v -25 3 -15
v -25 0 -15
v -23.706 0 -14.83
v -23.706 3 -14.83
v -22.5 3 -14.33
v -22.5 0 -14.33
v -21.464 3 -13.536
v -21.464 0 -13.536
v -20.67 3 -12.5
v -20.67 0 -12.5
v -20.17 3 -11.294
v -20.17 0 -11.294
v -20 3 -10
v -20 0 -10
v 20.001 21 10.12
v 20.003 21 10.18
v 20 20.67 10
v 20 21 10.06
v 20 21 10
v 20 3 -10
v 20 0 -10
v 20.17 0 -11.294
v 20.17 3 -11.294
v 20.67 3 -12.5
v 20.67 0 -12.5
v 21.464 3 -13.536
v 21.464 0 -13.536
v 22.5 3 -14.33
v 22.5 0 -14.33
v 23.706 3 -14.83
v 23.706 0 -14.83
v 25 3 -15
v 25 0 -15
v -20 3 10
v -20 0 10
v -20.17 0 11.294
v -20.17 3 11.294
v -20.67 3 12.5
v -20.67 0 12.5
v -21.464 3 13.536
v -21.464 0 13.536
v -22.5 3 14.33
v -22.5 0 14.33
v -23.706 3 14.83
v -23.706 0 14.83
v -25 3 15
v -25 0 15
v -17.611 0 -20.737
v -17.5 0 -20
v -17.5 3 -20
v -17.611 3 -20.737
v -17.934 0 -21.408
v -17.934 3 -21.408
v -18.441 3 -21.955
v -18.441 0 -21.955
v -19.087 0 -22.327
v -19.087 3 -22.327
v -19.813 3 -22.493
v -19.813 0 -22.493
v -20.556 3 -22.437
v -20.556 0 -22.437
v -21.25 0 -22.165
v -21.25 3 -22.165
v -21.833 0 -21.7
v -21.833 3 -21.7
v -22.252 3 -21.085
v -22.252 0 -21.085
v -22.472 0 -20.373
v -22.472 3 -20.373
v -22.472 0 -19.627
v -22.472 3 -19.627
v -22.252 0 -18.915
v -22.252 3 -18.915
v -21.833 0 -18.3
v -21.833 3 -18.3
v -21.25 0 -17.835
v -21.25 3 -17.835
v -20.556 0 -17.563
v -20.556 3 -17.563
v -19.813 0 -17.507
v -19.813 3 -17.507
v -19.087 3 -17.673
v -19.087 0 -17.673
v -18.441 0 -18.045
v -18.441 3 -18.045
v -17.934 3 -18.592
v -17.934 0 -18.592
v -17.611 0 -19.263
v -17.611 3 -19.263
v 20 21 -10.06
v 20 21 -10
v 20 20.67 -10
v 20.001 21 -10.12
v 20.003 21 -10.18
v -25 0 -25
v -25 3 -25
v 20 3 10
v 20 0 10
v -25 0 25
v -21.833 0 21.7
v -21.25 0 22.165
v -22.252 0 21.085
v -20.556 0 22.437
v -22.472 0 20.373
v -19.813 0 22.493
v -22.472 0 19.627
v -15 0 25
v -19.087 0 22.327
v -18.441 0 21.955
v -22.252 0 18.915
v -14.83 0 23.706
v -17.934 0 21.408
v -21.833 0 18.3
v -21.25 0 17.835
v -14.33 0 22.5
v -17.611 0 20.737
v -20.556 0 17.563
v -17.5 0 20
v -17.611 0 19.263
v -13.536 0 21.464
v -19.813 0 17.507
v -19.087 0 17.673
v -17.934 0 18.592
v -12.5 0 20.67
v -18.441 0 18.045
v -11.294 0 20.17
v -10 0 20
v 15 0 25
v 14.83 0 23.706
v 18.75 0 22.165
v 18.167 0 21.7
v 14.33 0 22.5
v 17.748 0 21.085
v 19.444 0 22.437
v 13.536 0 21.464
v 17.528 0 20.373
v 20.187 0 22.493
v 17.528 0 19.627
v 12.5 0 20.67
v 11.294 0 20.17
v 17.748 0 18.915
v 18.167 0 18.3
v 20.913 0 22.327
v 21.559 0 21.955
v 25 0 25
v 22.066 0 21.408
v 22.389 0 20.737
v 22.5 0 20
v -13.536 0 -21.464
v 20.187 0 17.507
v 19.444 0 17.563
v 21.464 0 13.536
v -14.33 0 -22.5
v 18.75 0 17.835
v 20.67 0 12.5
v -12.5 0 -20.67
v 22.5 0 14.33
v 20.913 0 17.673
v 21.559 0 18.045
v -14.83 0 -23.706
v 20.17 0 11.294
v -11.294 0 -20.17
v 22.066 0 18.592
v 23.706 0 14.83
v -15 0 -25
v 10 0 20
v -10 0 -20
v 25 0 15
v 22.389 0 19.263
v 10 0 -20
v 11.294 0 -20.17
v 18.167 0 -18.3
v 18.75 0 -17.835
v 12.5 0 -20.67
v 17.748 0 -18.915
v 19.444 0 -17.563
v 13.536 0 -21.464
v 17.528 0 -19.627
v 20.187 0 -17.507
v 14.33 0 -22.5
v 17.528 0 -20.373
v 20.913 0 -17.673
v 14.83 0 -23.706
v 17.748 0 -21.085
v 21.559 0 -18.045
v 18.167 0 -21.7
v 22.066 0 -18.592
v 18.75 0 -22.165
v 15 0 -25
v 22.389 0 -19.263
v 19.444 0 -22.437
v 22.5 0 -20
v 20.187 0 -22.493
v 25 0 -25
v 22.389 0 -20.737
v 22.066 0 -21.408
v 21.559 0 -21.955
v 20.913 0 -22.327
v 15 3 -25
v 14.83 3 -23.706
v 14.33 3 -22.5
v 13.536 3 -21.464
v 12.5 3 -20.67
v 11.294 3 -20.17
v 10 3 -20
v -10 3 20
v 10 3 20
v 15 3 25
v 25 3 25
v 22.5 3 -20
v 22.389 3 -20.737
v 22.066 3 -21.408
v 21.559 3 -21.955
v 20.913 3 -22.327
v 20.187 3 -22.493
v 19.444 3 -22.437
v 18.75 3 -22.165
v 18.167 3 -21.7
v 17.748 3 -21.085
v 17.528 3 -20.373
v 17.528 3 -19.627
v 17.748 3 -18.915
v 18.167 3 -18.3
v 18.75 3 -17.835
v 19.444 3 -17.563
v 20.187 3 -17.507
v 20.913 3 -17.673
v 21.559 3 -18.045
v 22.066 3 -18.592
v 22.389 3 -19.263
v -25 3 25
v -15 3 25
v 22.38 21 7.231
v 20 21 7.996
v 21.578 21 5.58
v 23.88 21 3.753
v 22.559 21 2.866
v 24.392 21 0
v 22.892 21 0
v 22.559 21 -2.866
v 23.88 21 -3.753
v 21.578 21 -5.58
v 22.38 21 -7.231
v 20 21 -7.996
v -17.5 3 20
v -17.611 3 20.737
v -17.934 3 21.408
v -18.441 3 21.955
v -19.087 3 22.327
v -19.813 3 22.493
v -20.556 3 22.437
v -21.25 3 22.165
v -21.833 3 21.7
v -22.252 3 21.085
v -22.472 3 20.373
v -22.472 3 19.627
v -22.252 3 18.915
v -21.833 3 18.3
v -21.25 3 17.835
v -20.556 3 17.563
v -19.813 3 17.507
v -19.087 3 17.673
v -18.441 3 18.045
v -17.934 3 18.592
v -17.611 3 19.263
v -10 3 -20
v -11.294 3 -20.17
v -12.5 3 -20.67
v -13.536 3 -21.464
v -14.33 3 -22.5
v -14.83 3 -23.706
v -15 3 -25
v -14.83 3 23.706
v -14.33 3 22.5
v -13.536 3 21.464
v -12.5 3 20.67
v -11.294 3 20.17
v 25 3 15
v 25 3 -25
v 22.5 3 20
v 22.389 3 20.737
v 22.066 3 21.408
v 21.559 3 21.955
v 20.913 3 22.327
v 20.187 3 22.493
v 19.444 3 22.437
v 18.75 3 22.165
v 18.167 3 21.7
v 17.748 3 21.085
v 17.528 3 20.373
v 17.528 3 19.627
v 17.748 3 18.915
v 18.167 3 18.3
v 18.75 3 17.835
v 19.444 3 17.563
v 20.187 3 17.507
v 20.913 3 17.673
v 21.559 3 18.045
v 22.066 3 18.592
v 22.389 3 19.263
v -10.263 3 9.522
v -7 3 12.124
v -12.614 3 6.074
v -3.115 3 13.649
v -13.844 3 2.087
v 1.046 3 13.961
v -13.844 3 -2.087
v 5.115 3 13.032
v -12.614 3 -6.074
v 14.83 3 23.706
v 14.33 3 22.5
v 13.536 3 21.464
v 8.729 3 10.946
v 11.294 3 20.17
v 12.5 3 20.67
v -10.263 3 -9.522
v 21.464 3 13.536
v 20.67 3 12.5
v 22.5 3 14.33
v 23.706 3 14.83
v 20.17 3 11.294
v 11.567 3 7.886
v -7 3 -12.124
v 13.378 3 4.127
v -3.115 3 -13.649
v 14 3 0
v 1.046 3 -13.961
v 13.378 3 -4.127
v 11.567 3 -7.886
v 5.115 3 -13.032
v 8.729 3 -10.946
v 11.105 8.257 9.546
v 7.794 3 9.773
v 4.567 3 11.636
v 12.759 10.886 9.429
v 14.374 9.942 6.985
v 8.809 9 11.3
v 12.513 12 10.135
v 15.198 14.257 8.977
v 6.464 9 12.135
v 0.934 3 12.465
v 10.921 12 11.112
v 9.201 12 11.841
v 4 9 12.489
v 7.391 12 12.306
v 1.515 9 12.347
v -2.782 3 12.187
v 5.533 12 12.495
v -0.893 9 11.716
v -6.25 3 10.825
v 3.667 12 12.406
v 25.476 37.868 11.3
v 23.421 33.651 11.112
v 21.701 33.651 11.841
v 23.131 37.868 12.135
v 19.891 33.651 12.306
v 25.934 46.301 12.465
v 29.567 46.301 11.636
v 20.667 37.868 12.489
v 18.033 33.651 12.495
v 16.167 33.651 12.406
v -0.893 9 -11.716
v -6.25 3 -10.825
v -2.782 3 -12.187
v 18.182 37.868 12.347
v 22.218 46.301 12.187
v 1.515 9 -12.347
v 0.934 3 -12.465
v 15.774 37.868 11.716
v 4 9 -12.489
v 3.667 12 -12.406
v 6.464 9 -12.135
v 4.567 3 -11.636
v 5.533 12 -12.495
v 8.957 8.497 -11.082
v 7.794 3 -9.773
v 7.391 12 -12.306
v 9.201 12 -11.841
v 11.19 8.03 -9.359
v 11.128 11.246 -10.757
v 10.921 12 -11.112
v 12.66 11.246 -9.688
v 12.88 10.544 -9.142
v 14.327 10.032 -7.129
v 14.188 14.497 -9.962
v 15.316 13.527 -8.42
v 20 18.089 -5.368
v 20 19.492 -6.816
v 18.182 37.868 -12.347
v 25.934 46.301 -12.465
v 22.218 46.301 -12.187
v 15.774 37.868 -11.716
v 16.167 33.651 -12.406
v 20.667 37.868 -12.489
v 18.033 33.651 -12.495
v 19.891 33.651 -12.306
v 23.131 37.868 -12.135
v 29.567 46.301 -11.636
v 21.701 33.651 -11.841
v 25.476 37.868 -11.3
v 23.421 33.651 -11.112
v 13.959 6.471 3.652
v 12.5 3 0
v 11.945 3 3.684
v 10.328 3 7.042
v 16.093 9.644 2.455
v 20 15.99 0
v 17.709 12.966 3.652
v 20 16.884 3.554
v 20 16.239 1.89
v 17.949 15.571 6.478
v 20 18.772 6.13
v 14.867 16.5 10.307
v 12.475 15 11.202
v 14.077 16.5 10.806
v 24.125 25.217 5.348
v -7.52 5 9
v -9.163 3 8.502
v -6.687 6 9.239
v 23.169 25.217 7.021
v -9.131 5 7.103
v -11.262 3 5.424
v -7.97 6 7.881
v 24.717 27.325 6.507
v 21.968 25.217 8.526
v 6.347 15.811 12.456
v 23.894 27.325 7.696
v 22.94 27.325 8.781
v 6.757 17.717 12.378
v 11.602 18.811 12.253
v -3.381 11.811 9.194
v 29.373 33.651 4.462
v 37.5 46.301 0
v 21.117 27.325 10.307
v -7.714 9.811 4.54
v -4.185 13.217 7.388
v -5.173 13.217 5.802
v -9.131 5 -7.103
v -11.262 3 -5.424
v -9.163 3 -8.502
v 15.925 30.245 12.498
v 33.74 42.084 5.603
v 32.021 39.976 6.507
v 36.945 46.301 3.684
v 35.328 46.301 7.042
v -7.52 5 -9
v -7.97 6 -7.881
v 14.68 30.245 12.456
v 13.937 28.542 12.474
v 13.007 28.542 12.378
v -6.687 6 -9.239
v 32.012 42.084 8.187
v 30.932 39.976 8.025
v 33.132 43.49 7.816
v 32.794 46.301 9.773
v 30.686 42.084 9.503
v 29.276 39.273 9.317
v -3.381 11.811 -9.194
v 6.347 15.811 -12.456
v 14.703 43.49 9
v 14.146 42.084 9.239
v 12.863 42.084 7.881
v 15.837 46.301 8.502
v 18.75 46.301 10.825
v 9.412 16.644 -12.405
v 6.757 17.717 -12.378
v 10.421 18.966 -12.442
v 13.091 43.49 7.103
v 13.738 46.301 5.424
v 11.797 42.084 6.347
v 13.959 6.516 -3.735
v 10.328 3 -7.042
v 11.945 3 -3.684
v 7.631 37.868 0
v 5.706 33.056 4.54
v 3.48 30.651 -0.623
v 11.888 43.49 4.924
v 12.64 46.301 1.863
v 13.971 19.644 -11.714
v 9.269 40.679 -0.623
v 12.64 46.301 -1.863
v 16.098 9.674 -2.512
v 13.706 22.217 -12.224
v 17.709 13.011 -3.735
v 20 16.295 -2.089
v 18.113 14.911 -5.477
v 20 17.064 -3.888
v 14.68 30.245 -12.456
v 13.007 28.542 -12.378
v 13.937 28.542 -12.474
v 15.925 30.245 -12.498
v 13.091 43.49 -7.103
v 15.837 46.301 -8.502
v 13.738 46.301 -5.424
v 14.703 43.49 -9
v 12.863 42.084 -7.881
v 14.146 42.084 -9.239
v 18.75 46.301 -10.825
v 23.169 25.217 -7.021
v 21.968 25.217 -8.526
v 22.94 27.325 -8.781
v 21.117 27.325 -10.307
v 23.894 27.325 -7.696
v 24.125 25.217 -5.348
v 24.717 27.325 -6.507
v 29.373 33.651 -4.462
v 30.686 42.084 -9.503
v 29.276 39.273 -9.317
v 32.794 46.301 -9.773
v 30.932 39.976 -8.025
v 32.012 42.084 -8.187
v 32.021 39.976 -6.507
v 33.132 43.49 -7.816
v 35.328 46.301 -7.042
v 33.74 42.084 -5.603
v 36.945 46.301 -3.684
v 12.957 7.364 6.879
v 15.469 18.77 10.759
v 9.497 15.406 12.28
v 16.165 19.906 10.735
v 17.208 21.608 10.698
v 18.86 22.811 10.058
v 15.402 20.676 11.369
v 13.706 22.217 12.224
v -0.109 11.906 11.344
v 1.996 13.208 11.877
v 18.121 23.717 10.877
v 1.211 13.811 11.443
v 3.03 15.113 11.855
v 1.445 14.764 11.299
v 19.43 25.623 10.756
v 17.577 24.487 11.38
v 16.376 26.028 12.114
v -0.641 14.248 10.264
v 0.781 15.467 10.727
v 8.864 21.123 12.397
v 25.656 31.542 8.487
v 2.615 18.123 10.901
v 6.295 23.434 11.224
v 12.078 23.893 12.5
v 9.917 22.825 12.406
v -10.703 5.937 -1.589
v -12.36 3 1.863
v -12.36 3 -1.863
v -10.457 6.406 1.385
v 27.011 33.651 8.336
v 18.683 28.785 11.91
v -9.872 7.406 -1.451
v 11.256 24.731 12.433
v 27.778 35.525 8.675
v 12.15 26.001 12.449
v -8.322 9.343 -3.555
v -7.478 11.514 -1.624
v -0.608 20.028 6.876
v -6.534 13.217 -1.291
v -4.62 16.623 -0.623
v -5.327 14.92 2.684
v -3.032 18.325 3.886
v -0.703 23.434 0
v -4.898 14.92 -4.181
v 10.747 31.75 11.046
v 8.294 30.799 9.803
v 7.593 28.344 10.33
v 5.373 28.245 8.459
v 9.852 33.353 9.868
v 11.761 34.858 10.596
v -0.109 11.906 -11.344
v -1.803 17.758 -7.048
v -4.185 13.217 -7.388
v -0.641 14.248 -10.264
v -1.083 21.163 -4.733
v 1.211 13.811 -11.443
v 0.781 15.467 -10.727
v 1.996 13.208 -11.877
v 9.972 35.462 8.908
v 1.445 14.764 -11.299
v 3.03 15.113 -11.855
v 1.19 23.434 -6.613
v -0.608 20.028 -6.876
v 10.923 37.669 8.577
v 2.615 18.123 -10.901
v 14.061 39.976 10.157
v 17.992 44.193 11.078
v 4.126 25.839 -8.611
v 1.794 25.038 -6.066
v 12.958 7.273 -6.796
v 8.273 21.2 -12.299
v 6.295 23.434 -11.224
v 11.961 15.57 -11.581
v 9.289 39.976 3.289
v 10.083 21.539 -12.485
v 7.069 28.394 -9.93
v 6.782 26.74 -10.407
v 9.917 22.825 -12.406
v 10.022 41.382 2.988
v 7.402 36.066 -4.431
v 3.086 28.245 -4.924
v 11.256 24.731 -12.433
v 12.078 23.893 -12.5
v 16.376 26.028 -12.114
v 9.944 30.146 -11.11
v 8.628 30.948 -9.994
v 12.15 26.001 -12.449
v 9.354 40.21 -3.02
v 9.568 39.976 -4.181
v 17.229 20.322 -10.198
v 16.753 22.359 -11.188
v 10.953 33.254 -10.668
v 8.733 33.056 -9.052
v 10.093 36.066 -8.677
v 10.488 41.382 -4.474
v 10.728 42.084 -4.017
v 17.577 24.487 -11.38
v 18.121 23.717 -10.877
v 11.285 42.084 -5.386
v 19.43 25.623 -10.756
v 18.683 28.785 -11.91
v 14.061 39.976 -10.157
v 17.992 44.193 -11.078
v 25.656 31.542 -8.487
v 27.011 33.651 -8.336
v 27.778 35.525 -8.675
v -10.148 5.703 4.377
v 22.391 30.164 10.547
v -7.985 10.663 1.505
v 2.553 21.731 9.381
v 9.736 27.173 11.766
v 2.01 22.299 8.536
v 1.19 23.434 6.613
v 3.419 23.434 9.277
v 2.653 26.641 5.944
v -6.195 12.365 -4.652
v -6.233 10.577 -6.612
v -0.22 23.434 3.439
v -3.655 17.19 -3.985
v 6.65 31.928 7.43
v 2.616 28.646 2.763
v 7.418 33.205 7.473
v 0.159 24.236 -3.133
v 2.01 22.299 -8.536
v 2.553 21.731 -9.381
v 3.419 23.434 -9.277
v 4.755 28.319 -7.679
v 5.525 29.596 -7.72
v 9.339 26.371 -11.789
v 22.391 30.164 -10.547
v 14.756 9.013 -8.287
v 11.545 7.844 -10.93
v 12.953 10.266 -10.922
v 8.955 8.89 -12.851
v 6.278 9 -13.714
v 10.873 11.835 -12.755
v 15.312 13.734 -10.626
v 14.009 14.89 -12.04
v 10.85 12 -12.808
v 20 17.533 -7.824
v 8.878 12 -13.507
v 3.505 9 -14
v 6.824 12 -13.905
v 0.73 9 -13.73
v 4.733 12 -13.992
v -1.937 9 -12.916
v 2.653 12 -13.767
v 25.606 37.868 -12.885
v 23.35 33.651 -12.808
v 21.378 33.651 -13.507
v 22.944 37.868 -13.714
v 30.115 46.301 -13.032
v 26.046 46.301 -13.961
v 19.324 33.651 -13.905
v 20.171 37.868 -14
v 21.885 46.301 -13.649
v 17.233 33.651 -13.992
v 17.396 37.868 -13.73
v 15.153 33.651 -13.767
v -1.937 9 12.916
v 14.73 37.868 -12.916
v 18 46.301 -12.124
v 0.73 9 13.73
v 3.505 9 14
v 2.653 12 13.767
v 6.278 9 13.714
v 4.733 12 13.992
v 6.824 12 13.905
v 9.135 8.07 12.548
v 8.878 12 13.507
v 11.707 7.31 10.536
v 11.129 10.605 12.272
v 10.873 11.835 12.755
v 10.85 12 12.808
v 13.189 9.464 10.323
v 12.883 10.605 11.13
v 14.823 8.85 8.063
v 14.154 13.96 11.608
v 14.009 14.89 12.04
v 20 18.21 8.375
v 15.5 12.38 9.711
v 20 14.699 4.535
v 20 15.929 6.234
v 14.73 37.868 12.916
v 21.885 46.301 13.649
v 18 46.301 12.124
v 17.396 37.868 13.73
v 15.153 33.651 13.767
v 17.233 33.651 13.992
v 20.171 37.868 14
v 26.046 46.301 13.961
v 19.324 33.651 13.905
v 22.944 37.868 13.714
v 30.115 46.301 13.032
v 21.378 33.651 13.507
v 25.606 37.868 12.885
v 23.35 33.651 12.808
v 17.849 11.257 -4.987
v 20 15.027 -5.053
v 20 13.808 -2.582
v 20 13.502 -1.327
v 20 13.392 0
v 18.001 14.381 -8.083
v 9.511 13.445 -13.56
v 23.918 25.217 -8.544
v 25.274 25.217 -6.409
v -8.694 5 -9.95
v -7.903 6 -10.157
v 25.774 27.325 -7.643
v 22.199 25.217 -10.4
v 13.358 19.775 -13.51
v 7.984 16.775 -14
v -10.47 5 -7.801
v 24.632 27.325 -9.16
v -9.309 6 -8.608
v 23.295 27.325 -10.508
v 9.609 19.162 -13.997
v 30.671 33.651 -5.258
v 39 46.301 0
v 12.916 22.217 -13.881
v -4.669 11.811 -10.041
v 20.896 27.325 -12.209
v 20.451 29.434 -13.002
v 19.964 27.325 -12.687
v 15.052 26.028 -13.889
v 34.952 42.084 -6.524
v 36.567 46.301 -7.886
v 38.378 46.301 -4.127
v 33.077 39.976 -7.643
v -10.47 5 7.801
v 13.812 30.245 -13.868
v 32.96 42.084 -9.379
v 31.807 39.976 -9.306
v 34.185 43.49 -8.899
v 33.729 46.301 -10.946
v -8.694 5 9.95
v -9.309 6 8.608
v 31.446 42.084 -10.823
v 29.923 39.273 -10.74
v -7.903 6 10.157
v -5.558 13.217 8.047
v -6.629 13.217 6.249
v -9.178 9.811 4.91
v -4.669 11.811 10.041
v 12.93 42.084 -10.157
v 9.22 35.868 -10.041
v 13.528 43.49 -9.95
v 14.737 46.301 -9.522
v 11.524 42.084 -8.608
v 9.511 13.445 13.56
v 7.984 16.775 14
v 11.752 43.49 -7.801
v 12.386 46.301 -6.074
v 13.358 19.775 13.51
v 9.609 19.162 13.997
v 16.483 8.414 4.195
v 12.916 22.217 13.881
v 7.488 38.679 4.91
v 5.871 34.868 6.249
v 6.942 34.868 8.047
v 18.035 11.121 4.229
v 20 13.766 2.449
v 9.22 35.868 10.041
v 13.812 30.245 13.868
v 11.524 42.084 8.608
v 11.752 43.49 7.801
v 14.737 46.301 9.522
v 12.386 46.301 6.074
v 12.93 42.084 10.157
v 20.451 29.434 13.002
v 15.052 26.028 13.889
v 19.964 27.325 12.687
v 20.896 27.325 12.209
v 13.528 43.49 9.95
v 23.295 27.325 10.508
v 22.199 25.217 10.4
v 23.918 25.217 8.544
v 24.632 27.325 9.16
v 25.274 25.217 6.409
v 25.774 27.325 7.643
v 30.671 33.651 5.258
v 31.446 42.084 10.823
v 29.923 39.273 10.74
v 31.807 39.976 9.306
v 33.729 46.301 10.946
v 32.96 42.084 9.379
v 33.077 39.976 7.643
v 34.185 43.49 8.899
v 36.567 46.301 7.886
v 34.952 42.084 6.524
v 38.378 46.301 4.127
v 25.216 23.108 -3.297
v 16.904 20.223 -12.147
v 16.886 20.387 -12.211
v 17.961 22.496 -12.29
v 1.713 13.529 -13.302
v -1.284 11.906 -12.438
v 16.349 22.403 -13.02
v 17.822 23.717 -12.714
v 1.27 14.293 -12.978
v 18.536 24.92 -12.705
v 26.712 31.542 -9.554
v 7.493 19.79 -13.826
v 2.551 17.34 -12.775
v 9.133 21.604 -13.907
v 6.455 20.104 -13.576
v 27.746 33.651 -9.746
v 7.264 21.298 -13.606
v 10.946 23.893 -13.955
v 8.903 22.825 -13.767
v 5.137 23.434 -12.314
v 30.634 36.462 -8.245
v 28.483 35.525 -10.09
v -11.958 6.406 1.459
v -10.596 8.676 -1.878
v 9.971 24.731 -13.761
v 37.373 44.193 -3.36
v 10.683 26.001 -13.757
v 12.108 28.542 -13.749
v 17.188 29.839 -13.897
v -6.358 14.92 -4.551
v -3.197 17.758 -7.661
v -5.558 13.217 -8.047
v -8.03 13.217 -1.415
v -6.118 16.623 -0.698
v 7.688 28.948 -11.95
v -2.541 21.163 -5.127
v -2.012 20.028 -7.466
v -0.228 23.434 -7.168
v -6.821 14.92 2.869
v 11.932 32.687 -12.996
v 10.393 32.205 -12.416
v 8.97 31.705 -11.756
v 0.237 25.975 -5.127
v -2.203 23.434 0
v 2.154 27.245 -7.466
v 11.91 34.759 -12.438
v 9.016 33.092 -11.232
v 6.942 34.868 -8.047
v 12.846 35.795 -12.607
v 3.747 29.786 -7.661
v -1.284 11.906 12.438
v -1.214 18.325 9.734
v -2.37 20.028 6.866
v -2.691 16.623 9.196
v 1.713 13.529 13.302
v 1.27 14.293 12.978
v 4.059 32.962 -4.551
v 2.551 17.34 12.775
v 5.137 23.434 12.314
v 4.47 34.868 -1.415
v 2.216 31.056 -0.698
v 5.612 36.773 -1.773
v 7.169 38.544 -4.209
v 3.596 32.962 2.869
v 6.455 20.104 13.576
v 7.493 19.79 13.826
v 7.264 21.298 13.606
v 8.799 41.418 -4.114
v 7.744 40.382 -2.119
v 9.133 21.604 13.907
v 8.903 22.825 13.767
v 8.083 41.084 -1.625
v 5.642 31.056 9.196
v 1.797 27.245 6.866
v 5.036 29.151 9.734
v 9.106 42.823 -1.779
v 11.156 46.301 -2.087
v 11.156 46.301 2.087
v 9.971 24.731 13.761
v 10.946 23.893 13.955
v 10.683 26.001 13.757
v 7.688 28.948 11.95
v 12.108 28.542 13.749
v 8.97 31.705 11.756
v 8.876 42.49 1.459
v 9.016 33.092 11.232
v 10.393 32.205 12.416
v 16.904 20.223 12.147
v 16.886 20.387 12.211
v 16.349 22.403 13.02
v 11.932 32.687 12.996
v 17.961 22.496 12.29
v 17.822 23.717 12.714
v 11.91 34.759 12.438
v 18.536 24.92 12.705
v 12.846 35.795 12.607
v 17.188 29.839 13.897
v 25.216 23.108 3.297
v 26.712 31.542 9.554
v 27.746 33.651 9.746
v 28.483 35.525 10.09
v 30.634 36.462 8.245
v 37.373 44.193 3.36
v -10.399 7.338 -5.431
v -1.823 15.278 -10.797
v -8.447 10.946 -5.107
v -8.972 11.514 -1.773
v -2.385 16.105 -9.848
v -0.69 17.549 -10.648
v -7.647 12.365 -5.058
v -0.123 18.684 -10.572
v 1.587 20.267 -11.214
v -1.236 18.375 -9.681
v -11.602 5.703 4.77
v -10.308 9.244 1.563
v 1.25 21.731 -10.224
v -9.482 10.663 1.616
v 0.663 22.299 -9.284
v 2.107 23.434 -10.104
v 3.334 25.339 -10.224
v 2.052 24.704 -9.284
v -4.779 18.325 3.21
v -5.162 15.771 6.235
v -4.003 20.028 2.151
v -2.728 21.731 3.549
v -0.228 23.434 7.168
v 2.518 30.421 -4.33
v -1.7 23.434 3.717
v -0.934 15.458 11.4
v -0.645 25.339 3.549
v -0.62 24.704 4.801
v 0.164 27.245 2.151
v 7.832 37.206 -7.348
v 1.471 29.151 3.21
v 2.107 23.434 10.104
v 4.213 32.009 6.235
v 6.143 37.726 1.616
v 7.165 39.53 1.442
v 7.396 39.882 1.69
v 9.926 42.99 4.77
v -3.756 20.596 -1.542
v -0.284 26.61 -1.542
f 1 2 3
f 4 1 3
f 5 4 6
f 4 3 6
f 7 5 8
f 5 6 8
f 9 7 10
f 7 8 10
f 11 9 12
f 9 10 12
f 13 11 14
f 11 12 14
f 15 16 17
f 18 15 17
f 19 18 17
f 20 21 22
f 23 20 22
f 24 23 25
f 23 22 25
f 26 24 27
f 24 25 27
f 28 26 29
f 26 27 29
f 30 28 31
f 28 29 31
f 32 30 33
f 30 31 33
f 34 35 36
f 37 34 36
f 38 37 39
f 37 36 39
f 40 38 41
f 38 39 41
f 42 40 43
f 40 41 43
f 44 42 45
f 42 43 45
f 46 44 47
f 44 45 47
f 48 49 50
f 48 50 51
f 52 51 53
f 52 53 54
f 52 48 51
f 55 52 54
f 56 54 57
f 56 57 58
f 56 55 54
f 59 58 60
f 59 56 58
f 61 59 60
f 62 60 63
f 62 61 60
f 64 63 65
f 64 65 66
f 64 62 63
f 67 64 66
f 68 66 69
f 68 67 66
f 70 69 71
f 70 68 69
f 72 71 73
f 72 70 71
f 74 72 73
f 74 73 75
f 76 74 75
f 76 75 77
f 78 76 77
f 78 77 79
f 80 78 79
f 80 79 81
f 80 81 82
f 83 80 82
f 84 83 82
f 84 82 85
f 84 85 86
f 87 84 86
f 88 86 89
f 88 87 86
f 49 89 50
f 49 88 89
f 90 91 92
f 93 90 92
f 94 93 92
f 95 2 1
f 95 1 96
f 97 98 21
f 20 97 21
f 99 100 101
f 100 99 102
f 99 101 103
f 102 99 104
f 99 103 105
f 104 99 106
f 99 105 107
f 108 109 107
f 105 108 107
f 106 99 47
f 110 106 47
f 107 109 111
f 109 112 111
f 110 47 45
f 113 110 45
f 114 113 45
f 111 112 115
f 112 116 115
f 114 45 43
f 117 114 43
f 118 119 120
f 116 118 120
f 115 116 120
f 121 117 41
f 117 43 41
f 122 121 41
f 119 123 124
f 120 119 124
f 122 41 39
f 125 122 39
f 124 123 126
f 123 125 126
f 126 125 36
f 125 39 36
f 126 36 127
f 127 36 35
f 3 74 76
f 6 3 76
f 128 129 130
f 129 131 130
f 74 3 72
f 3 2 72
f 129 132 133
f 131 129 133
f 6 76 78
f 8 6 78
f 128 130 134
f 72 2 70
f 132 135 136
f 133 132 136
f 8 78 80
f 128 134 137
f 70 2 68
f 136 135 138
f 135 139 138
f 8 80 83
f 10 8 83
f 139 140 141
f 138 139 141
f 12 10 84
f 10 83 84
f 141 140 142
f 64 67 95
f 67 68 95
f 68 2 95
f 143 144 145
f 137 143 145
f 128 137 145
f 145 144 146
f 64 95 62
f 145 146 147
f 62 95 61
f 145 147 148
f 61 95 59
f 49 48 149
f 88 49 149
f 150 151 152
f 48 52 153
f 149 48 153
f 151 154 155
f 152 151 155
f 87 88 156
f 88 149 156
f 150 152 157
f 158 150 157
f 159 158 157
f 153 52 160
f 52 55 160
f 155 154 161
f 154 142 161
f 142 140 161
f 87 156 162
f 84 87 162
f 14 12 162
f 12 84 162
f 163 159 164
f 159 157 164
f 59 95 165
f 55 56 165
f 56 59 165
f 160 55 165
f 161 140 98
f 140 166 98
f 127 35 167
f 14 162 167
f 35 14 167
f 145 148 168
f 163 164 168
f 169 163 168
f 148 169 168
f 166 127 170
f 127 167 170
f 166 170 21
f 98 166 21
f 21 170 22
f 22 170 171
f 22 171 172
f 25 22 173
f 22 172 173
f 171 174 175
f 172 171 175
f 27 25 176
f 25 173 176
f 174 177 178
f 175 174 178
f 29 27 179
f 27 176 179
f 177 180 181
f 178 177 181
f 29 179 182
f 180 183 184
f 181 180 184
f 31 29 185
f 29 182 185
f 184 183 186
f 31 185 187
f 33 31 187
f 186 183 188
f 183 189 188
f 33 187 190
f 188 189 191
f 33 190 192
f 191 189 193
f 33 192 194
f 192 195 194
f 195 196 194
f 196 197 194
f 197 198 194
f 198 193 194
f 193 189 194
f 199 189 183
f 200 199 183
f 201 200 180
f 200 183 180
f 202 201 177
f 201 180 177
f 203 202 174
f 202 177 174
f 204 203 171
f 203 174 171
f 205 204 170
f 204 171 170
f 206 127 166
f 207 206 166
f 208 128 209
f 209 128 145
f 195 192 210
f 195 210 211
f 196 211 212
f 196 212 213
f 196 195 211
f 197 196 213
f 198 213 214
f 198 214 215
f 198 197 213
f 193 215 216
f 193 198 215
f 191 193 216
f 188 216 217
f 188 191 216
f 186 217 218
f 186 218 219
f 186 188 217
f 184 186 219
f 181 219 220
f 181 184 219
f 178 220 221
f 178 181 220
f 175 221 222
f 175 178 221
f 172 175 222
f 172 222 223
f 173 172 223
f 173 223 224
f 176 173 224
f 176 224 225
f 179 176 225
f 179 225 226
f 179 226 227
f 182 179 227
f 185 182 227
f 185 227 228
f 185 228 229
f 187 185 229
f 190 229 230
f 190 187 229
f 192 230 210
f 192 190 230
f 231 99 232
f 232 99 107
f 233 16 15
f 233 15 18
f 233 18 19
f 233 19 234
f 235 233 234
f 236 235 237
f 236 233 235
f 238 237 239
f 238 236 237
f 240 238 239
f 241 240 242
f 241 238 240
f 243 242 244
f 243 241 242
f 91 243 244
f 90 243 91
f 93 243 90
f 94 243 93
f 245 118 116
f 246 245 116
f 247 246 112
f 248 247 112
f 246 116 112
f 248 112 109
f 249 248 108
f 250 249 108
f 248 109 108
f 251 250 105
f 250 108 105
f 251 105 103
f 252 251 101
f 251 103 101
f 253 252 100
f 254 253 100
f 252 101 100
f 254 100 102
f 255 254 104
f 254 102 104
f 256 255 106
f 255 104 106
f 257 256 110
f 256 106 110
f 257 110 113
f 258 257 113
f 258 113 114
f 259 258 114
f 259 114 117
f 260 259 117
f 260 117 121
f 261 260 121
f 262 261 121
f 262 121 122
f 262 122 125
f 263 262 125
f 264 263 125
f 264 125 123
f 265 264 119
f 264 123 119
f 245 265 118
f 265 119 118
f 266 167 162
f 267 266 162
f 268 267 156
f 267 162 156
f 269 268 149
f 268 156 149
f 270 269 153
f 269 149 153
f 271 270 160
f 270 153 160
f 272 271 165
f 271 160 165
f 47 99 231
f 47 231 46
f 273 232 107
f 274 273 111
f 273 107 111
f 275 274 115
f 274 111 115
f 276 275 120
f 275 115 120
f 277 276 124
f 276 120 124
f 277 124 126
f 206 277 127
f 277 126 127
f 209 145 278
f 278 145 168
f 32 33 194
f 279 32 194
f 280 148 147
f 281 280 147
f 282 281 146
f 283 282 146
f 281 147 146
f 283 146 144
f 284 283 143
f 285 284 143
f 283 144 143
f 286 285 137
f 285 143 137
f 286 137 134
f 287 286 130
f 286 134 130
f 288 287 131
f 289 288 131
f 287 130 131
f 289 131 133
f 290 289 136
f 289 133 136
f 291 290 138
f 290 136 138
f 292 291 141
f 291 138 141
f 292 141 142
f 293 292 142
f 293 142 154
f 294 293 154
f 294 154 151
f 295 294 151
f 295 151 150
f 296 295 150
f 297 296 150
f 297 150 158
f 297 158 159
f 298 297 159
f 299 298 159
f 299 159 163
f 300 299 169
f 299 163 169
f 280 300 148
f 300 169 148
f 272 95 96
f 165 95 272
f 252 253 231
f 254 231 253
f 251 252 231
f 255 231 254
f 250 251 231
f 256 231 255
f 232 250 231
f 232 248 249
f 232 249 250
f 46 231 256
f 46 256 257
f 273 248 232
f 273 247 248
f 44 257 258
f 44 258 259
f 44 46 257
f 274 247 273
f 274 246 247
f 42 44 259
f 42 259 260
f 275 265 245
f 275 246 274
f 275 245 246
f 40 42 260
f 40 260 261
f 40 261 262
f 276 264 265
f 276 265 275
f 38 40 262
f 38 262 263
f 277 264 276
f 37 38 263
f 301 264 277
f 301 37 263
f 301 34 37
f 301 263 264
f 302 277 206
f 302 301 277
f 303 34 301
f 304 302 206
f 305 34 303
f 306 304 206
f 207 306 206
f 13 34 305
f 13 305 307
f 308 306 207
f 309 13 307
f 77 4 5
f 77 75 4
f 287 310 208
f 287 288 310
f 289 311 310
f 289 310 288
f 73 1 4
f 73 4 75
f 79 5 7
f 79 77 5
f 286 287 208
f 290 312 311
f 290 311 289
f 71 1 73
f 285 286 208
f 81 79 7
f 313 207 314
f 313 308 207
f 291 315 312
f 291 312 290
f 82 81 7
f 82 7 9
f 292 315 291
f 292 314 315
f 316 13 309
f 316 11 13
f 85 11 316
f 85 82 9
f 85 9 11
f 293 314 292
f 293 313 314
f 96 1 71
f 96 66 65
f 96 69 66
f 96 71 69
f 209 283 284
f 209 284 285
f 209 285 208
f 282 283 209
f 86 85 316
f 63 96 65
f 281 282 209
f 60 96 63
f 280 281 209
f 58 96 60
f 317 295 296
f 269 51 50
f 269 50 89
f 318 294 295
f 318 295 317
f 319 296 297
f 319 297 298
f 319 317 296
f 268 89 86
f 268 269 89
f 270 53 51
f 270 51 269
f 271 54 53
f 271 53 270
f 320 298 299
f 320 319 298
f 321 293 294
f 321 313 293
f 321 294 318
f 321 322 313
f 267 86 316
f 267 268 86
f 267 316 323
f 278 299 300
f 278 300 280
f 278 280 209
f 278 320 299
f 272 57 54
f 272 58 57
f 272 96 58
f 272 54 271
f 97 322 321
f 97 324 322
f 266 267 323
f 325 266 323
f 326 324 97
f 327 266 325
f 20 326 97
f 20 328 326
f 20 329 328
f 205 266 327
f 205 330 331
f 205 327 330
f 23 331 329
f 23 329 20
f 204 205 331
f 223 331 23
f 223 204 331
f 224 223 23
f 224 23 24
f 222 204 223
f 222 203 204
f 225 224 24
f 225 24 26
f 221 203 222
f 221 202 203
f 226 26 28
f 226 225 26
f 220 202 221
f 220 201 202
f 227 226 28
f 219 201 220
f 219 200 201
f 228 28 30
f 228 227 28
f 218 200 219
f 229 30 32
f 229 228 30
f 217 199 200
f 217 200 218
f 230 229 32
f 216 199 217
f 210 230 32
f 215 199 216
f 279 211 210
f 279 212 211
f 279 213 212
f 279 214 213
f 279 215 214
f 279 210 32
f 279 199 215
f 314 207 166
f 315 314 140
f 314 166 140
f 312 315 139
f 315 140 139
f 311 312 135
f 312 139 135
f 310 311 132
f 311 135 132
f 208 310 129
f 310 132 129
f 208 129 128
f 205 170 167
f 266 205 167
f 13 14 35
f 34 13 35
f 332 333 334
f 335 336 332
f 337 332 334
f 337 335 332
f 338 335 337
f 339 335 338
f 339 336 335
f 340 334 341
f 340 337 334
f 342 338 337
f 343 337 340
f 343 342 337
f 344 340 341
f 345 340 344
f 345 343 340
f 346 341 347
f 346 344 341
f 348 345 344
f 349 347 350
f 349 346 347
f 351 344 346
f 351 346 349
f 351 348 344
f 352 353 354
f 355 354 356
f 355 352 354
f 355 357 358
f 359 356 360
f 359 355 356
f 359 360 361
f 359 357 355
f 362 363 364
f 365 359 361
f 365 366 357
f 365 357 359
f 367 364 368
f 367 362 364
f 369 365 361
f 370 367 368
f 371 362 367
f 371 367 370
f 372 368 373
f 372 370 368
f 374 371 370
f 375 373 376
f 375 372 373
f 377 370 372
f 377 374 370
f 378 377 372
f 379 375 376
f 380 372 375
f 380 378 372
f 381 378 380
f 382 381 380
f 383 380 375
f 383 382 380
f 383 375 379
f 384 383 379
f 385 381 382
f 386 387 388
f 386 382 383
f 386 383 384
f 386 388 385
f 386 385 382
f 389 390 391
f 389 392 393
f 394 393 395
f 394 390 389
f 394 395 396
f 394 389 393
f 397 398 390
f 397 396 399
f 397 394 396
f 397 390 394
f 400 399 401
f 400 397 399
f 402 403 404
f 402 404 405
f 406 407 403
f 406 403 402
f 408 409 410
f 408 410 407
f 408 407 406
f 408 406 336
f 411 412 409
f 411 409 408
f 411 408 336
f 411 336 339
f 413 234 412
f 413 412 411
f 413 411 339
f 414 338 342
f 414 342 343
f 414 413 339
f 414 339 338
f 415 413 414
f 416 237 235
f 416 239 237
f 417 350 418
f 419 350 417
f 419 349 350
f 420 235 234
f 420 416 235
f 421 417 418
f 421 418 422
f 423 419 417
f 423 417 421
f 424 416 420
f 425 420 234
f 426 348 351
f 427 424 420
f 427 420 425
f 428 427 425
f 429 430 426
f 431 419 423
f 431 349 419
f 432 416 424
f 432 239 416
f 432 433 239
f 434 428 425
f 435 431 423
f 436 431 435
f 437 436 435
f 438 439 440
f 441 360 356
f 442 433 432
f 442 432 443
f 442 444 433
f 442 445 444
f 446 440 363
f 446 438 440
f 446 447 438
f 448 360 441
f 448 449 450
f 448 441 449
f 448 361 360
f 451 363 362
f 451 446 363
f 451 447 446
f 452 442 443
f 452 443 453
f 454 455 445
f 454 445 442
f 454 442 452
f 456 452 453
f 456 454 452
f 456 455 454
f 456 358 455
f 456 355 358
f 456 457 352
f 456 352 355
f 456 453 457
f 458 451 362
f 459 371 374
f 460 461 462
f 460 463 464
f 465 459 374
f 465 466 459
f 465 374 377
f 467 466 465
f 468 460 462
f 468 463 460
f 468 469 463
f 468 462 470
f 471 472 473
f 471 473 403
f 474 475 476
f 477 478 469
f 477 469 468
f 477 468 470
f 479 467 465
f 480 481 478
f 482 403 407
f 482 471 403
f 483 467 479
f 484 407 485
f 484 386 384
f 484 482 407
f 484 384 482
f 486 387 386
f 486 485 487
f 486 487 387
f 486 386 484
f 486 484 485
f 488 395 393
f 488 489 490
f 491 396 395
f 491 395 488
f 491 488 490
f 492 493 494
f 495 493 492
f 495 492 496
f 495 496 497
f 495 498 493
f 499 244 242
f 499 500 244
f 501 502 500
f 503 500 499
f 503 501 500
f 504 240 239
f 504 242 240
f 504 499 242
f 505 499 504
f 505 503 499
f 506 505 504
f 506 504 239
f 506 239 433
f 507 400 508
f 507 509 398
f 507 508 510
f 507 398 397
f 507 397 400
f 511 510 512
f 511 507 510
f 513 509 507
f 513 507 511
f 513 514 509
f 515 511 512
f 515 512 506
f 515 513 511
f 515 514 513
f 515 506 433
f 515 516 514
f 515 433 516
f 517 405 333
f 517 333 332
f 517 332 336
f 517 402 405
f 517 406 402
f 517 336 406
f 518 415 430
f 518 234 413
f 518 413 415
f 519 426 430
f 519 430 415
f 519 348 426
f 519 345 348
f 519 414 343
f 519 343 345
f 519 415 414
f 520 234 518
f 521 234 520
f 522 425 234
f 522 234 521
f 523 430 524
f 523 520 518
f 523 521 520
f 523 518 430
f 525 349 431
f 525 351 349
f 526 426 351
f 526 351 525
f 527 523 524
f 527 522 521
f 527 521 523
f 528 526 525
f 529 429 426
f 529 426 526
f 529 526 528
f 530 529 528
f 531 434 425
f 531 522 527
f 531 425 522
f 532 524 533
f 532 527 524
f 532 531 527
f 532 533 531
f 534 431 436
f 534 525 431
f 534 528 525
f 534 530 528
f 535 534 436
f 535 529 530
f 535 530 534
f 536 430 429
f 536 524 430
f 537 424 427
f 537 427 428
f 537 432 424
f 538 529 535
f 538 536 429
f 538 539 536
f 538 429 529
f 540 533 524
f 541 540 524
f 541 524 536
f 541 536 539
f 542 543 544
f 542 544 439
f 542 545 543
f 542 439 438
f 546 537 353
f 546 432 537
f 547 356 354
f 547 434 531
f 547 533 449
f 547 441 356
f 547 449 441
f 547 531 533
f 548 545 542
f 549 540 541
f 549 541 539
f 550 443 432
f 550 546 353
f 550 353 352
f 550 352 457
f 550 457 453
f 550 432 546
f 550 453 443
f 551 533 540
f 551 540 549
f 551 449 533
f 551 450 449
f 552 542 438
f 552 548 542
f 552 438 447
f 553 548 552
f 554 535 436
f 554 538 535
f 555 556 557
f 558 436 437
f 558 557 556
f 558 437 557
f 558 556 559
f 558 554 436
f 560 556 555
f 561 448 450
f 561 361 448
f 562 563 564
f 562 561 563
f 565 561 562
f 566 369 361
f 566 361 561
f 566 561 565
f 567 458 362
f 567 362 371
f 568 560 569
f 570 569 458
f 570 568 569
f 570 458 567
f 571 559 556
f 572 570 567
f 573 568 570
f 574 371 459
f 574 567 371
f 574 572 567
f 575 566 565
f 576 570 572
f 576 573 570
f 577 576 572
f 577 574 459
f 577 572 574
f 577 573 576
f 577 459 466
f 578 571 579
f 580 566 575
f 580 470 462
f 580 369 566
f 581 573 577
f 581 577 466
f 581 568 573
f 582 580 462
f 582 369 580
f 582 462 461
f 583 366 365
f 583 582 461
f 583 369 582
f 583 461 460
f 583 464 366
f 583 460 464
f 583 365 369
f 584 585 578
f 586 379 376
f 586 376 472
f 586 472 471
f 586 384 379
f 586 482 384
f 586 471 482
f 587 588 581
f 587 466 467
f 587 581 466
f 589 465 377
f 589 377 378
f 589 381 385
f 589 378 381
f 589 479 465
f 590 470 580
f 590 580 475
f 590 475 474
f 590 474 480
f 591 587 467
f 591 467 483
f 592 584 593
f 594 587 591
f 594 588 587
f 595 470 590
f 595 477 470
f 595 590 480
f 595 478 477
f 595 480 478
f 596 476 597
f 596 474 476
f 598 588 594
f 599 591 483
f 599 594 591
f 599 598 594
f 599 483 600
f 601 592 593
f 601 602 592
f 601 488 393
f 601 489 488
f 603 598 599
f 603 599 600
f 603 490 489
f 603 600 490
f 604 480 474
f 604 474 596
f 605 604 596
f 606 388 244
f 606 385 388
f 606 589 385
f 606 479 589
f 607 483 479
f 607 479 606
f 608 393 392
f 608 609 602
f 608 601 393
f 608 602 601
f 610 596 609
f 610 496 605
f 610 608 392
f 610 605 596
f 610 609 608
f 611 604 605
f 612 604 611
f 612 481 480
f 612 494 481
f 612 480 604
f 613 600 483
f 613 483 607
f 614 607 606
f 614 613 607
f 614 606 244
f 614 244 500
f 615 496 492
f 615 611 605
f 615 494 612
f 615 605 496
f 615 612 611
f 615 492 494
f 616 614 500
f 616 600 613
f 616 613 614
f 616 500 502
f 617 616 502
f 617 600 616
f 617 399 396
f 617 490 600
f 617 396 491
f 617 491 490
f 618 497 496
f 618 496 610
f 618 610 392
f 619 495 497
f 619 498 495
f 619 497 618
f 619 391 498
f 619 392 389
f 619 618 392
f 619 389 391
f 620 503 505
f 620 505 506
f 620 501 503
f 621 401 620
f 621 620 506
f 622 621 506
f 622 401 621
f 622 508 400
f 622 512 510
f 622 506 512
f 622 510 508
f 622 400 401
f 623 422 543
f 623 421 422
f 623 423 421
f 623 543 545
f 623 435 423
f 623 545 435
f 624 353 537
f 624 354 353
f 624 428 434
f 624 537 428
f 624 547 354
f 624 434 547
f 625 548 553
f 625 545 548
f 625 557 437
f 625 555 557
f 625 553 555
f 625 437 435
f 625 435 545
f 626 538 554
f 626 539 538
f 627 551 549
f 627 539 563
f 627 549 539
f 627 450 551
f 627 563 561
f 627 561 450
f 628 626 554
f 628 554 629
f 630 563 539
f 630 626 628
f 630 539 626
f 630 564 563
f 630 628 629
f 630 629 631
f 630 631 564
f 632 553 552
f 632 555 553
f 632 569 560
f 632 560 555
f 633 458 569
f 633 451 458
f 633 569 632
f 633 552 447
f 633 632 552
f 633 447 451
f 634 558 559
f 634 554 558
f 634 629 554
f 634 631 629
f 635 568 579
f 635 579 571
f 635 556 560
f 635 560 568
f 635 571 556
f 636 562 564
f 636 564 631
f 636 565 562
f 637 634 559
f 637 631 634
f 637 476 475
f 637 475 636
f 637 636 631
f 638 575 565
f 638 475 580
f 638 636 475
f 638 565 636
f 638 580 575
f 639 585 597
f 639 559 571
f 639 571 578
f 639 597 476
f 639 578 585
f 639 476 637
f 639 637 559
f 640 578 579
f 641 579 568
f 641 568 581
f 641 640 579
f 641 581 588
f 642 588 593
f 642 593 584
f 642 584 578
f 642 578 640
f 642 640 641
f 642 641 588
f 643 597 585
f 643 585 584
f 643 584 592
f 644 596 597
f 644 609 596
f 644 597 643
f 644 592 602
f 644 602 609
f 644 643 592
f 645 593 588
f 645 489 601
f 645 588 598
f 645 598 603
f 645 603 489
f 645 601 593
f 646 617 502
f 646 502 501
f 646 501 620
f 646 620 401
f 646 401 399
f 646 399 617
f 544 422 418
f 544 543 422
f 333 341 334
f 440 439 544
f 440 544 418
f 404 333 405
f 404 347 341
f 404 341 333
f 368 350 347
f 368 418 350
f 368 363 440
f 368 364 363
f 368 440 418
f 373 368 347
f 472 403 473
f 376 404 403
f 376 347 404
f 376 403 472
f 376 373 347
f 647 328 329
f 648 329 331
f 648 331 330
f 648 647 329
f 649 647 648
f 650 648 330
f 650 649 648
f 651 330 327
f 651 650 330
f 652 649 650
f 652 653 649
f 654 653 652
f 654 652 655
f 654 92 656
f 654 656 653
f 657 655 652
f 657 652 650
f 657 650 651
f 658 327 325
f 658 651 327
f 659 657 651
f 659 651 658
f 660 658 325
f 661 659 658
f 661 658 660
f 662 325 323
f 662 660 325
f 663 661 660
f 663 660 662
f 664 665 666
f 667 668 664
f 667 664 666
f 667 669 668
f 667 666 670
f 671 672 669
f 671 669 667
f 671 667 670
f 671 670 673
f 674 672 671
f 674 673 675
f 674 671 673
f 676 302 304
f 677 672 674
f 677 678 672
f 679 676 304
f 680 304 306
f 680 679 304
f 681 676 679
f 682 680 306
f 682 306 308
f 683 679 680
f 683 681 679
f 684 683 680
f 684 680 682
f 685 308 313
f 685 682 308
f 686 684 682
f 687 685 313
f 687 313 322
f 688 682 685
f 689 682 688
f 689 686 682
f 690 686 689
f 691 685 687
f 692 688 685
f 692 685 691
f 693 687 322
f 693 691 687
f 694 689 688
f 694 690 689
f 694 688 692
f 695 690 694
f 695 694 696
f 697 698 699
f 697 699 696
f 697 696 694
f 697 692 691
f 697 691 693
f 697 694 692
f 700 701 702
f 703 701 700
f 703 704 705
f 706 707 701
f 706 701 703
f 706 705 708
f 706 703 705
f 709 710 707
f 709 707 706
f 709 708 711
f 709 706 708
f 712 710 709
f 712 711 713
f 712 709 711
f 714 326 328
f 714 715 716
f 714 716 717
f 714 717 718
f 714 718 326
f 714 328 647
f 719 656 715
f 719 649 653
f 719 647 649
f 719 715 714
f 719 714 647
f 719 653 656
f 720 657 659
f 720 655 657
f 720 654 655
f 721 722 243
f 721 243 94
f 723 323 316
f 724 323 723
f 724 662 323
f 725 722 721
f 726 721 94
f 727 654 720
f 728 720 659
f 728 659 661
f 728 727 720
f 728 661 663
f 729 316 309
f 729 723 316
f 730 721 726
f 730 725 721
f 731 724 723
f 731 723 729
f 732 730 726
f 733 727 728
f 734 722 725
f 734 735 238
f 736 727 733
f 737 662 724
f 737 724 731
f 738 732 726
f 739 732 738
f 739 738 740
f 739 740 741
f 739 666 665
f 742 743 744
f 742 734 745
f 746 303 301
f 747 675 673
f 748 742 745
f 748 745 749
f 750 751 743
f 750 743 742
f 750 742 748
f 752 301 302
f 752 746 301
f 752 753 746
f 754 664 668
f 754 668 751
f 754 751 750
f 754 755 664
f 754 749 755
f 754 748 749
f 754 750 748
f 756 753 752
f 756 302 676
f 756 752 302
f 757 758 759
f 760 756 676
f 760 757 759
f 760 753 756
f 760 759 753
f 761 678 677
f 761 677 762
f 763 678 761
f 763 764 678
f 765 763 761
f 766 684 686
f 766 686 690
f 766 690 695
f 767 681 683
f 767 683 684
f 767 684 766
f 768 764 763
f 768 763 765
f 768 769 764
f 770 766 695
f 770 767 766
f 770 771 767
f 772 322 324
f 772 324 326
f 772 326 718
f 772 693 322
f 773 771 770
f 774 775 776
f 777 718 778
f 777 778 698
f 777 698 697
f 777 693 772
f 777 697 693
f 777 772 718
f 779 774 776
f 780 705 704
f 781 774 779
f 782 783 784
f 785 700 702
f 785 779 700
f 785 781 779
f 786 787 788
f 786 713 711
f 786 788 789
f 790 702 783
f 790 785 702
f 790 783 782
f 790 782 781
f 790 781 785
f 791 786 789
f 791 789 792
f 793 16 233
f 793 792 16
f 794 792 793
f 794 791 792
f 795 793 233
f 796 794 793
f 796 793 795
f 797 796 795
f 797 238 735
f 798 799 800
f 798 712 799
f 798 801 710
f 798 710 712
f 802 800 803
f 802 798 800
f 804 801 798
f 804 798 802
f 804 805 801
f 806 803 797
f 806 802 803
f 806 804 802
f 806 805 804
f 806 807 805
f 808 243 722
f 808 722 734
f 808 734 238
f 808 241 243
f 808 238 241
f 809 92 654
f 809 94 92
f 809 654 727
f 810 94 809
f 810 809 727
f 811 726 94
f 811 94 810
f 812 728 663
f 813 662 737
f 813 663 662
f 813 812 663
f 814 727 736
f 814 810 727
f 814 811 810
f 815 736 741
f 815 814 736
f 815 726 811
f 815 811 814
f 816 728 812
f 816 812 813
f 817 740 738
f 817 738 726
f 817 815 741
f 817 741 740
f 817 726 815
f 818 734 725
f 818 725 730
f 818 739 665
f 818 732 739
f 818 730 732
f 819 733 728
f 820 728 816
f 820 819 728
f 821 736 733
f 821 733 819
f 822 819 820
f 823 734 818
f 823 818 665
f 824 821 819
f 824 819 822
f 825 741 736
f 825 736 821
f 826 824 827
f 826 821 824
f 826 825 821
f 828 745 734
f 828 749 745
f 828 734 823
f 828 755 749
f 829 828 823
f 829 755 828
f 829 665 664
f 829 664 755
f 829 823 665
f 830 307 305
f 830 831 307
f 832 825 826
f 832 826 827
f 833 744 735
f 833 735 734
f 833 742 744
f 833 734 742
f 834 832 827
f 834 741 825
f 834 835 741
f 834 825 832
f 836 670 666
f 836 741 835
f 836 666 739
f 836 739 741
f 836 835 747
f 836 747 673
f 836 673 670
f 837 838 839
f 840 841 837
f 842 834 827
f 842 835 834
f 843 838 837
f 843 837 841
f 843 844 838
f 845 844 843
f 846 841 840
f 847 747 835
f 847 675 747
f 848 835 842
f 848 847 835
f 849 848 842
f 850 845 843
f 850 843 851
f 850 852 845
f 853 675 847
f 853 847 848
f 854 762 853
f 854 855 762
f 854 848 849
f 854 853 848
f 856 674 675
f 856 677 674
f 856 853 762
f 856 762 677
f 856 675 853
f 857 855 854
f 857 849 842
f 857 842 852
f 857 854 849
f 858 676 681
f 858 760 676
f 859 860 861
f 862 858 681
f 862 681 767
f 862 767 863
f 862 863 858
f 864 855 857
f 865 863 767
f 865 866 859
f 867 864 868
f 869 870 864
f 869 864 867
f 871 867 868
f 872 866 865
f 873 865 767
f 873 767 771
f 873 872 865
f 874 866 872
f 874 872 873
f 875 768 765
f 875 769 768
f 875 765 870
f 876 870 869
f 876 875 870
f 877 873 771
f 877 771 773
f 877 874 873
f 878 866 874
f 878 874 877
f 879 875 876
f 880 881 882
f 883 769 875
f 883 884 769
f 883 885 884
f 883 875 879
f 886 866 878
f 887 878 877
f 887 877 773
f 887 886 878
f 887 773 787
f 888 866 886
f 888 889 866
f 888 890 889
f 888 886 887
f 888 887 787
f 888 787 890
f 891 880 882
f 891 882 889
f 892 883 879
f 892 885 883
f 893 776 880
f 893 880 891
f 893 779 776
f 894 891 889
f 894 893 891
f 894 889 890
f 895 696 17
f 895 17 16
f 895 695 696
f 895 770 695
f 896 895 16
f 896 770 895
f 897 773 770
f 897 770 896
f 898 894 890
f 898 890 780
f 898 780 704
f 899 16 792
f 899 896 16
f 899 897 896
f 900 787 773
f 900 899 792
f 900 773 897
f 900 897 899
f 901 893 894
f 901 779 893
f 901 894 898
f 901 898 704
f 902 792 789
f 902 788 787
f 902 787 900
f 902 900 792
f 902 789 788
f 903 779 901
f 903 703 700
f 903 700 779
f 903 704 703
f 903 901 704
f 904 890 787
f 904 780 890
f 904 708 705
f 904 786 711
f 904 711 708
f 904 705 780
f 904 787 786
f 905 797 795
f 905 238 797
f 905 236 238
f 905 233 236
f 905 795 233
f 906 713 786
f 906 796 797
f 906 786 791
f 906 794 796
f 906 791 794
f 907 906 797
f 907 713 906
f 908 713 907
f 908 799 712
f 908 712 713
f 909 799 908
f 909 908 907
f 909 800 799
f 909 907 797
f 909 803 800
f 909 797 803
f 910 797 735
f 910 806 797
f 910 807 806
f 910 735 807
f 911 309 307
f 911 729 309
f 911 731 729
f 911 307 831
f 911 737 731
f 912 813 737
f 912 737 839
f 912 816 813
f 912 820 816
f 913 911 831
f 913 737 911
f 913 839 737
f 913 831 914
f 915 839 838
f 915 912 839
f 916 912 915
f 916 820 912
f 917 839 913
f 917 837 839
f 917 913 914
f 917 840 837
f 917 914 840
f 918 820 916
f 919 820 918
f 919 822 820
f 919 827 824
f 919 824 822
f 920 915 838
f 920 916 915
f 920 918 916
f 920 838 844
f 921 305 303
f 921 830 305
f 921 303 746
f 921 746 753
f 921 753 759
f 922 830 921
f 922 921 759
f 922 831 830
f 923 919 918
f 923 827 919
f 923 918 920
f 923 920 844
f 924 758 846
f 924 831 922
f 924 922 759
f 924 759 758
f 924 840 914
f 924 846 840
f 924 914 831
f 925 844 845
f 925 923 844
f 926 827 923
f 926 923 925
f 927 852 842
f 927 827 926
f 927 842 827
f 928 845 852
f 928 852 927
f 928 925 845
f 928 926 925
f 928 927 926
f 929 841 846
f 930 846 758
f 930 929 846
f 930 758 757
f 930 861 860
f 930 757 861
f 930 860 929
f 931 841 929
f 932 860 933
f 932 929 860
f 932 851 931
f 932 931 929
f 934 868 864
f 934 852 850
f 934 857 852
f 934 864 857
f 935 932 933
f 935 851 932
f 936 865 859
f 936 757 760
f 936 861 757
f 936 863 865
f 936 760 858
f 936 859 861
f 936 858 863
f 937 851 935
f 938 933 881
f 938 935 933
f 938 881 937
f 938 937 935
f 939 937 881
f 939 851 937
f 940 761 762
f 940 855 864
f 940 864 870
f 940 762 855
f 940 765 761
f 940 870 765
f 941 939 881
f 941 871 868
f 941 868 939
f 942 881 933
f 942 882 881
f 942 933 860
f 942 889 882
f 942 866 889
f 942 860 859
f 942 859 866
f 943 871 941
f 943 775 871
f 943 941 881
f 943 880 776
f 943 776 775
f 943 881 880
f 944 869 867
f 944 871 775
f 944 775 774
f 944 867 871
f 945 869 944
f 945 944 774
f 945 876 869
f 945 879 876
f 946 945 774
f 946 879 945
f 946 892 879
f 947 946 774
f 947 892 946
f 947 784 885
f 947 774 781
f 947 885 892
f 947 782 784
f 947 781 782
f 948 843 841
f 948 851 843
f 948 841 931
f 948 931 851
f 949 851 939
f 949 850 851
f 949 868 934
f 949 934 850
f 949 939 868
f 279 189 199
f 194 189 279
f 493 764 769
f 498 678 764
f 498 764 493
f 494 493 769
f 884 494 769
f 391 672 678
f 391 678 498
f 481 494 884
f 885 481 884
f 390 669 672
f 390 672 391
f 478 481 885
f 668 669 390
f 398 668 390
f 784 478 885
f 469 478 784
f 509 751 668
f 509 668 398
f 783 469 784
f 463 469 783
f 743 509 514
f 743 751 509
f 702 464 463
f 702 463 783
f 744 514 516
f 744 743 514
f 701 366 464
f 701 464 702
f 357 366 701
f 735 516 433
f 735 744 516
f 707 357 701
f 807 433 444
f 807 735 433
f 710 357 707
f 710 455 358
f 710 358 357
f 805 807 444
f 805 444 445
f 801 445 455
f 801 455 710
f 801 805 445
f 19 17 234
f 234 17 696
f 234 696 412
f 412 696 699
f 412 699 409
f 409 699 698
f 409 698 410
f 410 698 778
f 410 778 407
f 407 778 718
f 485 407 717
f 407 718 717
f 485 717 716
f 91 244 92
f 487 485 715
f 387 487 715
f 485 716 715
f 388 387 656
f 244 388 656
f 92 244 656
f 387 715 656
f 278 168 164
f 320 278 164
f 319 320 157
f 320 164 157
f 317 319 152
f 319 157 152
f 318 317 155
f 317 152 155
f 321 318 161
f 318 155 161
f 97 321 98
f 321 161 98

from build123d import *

# Parameters (mm, degrees)
SKETCH1_W           = 50
SKETCH1_H           = 50
BOSS_EXTRUDE1_DEPTH = 3
SKETCH3_R           = 14
SKETCH3_R_2         = 12.5
SKETCH4_R           = 2.5
CUT_EXTRUDE13_DEPTH = 3
SKETCH8_R           = 2.5
CUT_EXTRUDE20_DEPTH = 3
CUT_EXTRUDE22_DEPTH = 21
CIRPATTERN4_COUNT   = 4


with BuildPart() as part:
    # Sketch1 → Boss-Extrude1 (new body)
    with BuildSketch(Plane(origin=(0, 0, 0), x_dir=(1, 0, 0), z_dir=(0, 1, 0))):
        Rectangle(SKETCH1_W, SKETCH1_H)
    extrude(amount=BOSS_EXTRUDE1_DEPTH)

    # Sweep1: sweep along a path in Sketch2
    with BuildLine(Plane.XY) as sweep1_path:
        Line((0, 3), (25, 46.301270189))
    # Sketch3 → Sweep1 (sweep)
    with BuildSketch(Plane(origin=(0, 3, 0), x_dir=(1, 0, 0), z_dir=(0, 1, 0))):
        Circle(SKETCH3_R)
        Circle(SKETCH3_R_2, mode=Mode.SUBTRACT)
    sweep(path=sweep1_path.line)

    # Sketch4 → Cut-Extrude13 (cut)
    with BuildSketch(Plane(origin=(0, 0, 0), x_dir=(1, 0, 0), z_dir=(0, 1, 0))):
        with Locations((-20, 20)):
            Circle(SKETCH4_R)
    cut_extrude13 = extrude(amount=CUT_EXTRUDE13_DEPTH, mode=Mode.SUBTRACT)

    # Sketch8 → Cut-Extrude20 (cut)
    with BuildSketch(Plane(origin=(0, 0, 0), x_dir=(1, 0, 0), z_dir=(0, 1, 0))):
        with Locations((20, 20)):
            Circle(SKETCH8_R)
    cut_extrude20 = extrude(amount=CUT_EXTRUDE20_DEPTH, mode=Mode.SUBTRACT)

    # Mirror1: Cut-Extrude20 across plane
    add(cut_extrude20.mirror(Plane.XY), mode=Mode.SUBTRACT)

    # Mirror2: Cut-Extrude13 across plane
    add(cut_extrude13.mirror(Plane.XY), mode=Mode.SUBTRACT)

    # Sketch9 → Cut-Extrude22 (cut)
    with BuildSketch(Plane(origin=(0, 0, 0), x_dir=(1, 0, 0), z_dir=(0, 1, 0))):
        with BuildLine():
            Line((-10, 30), (10, 30))
            ThreePointArc((10, 30), (15, 25), (10, 20))
            Line((10, 20), (-10, 20))
            ThreePointArc((-10, 20), (-15, 25), (-10, 30))
        make_face()
    cut_extrude22 = extrude(amount=CUT_EXTRUDE22_DEPTH, mode=Mode.SUBTRACT)

    # CirPattern4: Cut-Extrude22 ×4 about axis
    cirpattern4_axis = Axis((0, 17.053416503, 0), (0, 1, 0))
    for i in range(1, CIRPATTERN4_COUNT):
        add(cut_extrude22.rotate(cirpattern4_axis, i * 360 / CIRPATTERN4_COUNT), mode=Mode.SUBTRACT)


solid = part.part
